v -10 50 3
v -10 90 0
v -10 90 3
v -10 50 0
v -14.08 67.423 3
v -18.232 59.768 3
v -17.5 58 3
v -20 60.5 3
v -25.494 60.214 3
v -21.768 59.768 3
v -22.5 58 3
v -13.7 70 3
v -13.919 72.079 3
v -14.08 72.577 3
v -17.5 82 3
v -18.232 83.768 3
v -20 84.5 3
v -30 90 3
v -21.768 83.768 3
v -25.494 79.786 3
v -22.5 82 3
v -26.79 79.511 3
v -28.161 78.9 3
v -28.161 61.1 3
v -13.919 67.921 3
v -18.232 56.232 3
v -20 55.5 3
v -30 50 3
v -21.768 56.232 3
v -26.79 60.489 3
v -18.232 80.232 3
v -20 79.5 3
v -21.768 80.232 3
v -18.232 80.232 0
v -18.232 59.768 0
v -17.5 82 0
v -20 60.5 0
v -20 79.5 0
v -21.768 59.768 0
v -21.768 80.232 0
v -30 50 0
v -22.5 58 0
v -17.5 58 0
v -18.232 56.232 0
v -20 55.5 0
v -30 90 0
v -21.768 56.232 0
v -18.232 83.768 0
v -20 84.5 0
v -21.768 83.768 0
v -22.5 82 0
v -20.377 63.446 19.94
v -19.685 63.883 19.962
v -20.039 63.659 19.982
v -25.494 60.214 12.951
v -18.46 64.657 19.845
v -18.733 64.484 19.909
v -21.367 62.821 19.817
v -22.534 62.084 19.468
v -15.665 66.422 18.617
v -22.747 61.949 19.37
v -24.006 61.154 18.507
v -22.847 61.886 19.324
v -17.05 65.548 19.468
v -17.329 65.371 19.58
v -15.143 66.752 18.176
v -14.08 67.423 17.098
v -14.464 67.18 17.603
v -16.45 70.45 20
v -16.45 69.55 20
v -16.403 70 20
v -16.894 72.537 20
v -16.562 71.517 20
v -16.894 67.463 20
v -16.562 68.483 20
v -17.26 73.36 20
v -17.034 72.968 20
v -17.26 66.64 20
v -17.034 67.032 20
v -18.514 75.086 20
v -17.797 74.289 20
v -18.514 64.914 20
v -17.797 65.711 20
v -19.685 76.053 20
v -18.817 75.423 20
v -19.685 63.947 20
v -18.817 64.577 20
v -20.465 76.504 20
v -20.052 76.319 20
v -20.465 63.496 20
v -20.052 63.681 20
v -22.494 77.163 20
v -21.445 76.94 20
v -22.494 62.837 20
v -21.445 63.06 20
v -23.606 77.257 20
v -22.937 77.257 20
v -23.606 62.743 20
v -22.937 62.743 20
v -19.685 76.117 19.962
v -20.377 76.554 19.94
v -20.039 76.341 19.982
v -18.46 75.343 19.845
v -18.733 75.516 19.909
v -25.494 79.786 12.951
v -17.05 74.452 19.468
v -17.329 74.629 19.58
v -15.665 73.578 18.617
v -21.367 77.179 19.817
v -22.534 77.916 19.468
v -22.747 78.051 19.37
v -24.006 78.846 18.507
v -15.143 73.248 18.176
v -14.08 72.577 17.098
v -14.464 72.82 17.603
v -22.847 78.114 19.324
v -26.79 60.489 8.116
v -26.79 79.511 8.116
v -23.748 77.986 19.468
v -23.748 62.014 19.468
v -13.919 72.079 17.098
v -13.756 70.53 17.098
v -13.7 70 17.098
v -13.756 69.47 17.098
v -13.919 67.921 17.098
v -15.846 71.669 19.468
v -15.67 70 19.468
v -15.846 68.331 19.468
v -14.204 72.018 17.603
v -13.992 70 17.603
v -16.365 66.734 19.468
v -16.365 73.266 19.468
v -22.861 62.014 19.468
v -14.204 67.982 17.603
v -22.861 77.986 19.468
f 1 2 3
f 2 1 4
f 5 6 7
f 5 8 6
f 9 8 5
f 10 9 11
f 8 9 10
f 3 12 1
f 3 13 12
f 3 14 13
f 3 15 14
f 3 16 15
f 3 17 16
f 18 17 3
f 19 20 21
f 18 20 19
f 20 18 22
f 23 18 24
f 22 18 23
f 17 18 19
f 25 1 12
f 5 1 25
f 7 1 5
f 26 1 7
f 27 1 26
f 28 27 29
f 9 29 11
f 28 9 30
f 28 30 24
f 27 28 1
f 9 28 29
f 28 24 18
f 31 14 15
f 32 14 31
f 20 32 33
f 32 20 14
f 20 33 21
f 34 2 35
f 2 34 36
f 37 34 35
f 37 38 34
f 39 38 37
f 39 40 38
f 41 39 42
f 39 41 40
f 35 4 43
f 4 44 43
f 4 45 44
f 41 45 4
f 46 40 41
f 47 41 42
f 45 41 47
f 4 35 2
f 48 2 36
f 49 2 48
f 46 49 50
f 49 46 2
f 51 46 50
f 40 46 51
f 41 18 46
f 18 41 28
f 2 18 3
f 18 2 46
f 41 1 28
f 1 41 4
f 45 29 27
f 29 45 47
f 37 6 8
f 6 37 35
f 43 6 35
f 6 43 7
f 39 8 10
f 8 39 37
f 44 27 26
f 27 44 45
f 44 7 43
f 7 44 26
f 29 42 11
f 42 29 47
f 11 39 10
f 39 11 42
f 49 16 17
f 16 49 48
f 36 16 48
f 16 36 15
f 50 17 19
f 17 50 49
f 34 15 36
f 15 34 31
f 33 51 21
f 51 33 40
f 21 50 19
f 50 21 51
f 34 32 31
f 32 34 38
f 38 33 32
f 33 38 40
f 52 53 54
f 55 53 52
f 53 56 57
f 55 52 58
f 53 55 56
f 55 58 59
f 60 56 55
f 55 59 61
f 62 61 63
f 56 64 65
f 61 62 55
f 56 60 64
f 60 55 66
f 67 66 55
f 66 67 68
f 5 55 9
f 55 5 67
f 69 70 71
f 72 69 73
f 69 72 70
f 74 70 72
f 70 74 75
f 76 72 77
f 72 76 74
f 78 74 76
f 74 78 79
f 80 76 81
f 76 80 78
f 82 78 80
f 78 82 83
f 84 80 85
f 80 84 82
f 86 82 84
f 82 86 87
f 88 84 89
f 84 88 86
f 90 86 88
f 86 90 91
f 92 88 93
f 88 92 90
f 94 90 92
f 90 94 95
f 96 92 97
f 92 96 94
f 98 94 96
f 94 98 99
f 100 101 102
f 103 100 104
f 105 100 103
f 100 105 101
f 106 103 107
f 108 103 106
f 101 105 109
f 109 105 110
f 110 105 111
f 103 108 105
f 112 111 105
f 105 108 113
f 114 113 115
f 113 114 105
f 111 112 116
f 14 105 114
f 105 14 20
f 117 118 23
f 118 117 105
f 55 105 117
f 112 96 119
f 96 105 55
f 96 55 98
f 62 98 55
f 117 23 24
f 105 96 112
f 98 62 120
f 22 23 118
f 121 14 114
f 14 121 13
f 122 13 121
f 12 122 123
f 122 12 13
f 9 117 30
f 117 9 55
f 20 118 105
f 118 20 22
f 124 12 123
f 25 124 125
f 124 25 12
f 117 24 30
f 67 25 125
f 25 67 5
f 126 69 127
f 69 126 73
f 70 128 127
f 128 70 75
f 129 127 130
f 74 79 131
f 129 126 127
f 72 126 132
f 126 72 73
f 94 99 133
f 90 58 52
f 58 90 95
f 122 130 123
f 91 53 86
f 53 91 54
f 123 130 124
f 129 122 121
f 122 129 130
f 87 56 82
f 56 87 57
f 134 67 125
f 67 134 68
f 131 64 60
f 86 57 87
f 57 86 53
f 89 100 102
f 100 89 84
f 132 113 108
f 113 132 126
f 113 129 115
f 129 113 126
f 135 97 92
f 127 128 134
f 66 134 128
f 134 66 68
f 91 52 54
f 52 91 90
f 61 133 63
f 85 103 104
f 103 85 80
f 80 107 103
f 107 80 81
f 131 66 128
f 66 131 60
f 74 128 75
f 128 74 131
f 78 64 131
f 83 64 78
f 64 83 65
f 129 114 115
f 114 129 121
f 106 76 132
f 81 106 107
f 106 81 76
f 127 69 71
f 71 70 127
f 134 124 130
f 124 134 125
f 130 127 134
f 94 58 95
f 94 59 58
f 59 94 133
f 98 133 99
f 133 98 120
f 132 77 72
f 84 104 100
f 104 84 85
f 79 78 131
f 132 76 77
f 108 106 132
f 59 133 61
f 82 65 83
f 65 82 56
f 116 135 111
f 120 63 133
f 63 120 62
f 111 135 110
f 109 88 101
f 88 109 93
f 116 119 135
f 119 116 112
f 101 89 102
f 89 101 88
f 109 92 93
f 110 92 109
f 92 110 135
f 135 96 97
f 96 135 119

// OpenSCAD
// file: ../lib/lego.scad
//narrow_brick(height=3);

plate([2,3], hollow=false);

// NOTE: The bricks described here are not perfectly fit to the tolerances of a
//             consumer injection-molded peg-and-socket brick. They snap tight to
//             one another, but not all that well to the consumer-grade bricks.

// src: https://bricks.stackexchange.com/questions/288/what-are-the-dimensions-of-a-lego-brick

lego = 1.6;

wall = lego * .95; // * 1.0
toler = 1;

stud_diam = 3 * lego + .5 * toler; // .2
stud_inner = 2 * lego + .5 * toler; // .2
stud_height = 1 * lego;

duct_diam = 5 * sqrt(2) - 3 + 2.5 * toler;
duct_inner = duct_diam - wall - .2*toler; // 0

brick_one = 5 * lego;
inner_one = brick_one - (wall*2);

//
// API modules
///
function lego_unit() = lego;

function brick_unit() = brick_one;

function brick_height() = 6;

function plate_height() = 2;

module plate(grid=[3,2], pegs=true, hollow=true, posts=true) {
    brick(grid, plate_height(), pegs, hollow, posts);
}

module brick(grid=[2,1], height=brick_height(), pegs=true, hollow=true, posts=true) {
    if (grid[0] < grid[1]) translate([0, grid[0]*brick_one, 0]) rotate([0,0,-90]) brick([grid[1], grid[0]], height, pegs, hollow, posts);
    else {
        if (grid[1] > 1) wide_brick(grid, height, pegs, hollow);
        else narrow_brick(grid[0], height, pegs, hollow, posts);
        }
}

//
// Subroutine modules
//
module wide_brick(grid, height, pegs, hollow) {
    union() {
        brick_sans_posts(grid, height, pegs, hollow);
        difference() {
            for (col = [1 : grid[1]-1]) for(row = [1:grid[0]-1]) color([0,1,1]) translate([brick_one*col,brick_one*row,0]) cylinder(d=duct_diam, lego*height-wall/2);
            for (col = [1 : grid[1]-1]) for(row = [1:grid[0]-1]) color([1,1,1]) translate([brick_one*col,brick_one*row,0]) cylinder(d=duct_inner, lego*height-wall/2);
            }
    }
}

module narrow_brick(length, height, pegs, hollow, posts) {
    union() {
        brick_sans_posts([length, 1], height, pegs, hollow);
        if (posts && length>1) for (spot = [1 : length-1]) color([0,1,0]) translate([brick_one/2,brick_one*spot,0]) cylinder(d=stud_inner, lego*height);
        }
}

module brick_sans_posts(grid, height, pegs, hollow) {
    difference() {
        brick_sans_hollow(grid, height, pegs);
        color([0,0,1]) translate([wall,wall,0]) cube([inner_one+(grid[1]-1)*brick_one, inner_one+(grid[0]-1)*brick_one, lego*height - wall+toler/2]);
        if (pegs && hollow) for (col = [1 : grid[1]]) for(row = [1:grid[0]]) color([1,1,0]) translate([brick_one*(col-.5),brick_one*(row-.5),lego*height-wall*2]) cylinder(d=stud_inner, stud_height+wall*2);
        }
}

module brick_sans_hollow(grid, height, pegs) {
    union() {
        cube([brick_one*grid[1], brick_one*grid[0], lego*height]);
        if (pegs) for (col = [1 : grid[1]]) for(row = [1:grid[0]]) color([1,0,0]) translate([brick_one*(col-.5),brick_one*(row-.5),lego*height]) cylinder(d=stud_diam, stud_height);
        }
}
// main file
use <../lib/lego.scad>;

sink_depth = 2.8;
m5_diam = 5;
m5_drill = 5;


//frame(pegs=true);

//back();

translate([-30, 50, 0]) base(slope=15);

//translate([-30, 0, 0])  sheath(slope=15);


module sheath(width=20, length=40, depth=3, hole=8, post_inset=3, post_height=20, slope=5) {
    union() {
        difference() {
            post(width, length, post_height-depth, hole, post_inset, 5.5, slope);
            translate([1,0,0]) post(width, length, post_height-depth, hole, post_inset,2, slope);
        translate([width/2-post_inset,0,0]) cube([9.25,length,3]);
        }

        rotate([0,slope,0]) {
            translate([post_inset, (length-3*brick_unit())/2 ,.5]) rotate([0,-90,0]) brick(grid=[3,3], height=0, hollow=false);
  //        translate([post_inset,(length-3*brick_unit())/2+brick_unit(),-brick_unit()/5]) rotate([0,-90,0]) brick(grid=[1,3], height=0, hollow=false);
        }
    }
}

module base(width=20, length=40, depth=3, hole=8, drill=5, post_inset=1, post_height=20, slope=5) {
    difference() {
        cube([width, length, depth]);
        translate([width/2, hole, 0]) cylinder(d=drill, depth);
        translate([width/2, length-hole, 0]) cylinder(d=drill, depth);
    }
    post(width, length, post_height, hole, post_inset, 0, slope);
}

module post(width, length, height, hole, inset, extra=0, slope) {
    round = (width+inset)*.3;
    diam = length-(2*hole)+2*extra;
    intersection() {
        post_core(width, length, height, hole, inset, extra, round, slope);
        union() {
            difference() {
                color([1,0,0]) translate([round, length/2, height+extra-1.5*round]) sphere(d=diam);
                color([1,1,0]) translate([round-diam/2, length/2-diam/2, height+extra-1.5*round-diam/2]) cube([diam, diam, diam/2]);
            }
        }
    }

        intersection() {
            post_core(width, length, height, hole, inset, extra, round, slope);
            color([1,1,0]) translate([round-diam/2, length/2-diam/2, height+(extra-1.5*round-diam/2)]) cube([diam, diam, diam/2]);
       }
    }

module post_core(width, length, height, hole, inset, extra, round, slope) {
    intersection() {
        difference() {
            linear_extrude(height+2*extra) polygon(points=[ [inset-extra, hole-extra], [inset-extra, length-hole+extra], [width+extra, length/2] ]);
            color([1,0,1]) rotate([0, slope,0]) translate([-slope,hole-extra,-5]) cube([inset+slope,length-2*hole+2*extra,height+2*extra+10]);
        }
        color([0,1,0]) translate([round, length/2, 0]) cylinder(d=width+2*extra, height+2*extra);
    }
}

module frame(width=8, length=12, pegs=true) {
    union() {
        length = length -2;
        translate([0, brick_unit(), 0]) plate([length,1], pegs, hollow=false, posts=false);

        translate([brick_unit()*(width-1),  brick_unit(), 0]) plate([length,1], pegs, hollow=false, posts=false);
        plate([1,width], pegs, hollow=false, posts=false);
        translate([0,brick_unit()*(length+1),0]) plate([1,width], pegs, hollow=false, posts=false);
    }
}

module back(shallow = .16) {
    letterbox = (12-3)/2*brick_unit();
    difference() {
        union() {
            frame(8,12);
            translate([1*brick_unit(), 1*brick_unit(), 0]) frame(6,10, false);
            translate([2*brick_unit(), 2*brick_unit(), 0]) frame(4,8, false);
            translate([3*brick_unit(), 3*brick_unit(), 0]) frame(2,6, false);

            cube([8*brick_unit(), letterbox, 2*lego_unit()]);
            translate([0, 12*brick_unit()-letterbox, 0]) cube([8*brick_unit(), letterbox, 2*lego_unit()]);
            cube([5*brick_unit(), 12*brick_unit(), 2*lego_unit()]);
        }
        color([0,1,0]) translate([.75*brick_unit(),.75*brick_unit(),2*lego_unit()-shallow]) cube([6.5*brick_unit(),10.5*brick_unit(), shallow]);
    }
}
